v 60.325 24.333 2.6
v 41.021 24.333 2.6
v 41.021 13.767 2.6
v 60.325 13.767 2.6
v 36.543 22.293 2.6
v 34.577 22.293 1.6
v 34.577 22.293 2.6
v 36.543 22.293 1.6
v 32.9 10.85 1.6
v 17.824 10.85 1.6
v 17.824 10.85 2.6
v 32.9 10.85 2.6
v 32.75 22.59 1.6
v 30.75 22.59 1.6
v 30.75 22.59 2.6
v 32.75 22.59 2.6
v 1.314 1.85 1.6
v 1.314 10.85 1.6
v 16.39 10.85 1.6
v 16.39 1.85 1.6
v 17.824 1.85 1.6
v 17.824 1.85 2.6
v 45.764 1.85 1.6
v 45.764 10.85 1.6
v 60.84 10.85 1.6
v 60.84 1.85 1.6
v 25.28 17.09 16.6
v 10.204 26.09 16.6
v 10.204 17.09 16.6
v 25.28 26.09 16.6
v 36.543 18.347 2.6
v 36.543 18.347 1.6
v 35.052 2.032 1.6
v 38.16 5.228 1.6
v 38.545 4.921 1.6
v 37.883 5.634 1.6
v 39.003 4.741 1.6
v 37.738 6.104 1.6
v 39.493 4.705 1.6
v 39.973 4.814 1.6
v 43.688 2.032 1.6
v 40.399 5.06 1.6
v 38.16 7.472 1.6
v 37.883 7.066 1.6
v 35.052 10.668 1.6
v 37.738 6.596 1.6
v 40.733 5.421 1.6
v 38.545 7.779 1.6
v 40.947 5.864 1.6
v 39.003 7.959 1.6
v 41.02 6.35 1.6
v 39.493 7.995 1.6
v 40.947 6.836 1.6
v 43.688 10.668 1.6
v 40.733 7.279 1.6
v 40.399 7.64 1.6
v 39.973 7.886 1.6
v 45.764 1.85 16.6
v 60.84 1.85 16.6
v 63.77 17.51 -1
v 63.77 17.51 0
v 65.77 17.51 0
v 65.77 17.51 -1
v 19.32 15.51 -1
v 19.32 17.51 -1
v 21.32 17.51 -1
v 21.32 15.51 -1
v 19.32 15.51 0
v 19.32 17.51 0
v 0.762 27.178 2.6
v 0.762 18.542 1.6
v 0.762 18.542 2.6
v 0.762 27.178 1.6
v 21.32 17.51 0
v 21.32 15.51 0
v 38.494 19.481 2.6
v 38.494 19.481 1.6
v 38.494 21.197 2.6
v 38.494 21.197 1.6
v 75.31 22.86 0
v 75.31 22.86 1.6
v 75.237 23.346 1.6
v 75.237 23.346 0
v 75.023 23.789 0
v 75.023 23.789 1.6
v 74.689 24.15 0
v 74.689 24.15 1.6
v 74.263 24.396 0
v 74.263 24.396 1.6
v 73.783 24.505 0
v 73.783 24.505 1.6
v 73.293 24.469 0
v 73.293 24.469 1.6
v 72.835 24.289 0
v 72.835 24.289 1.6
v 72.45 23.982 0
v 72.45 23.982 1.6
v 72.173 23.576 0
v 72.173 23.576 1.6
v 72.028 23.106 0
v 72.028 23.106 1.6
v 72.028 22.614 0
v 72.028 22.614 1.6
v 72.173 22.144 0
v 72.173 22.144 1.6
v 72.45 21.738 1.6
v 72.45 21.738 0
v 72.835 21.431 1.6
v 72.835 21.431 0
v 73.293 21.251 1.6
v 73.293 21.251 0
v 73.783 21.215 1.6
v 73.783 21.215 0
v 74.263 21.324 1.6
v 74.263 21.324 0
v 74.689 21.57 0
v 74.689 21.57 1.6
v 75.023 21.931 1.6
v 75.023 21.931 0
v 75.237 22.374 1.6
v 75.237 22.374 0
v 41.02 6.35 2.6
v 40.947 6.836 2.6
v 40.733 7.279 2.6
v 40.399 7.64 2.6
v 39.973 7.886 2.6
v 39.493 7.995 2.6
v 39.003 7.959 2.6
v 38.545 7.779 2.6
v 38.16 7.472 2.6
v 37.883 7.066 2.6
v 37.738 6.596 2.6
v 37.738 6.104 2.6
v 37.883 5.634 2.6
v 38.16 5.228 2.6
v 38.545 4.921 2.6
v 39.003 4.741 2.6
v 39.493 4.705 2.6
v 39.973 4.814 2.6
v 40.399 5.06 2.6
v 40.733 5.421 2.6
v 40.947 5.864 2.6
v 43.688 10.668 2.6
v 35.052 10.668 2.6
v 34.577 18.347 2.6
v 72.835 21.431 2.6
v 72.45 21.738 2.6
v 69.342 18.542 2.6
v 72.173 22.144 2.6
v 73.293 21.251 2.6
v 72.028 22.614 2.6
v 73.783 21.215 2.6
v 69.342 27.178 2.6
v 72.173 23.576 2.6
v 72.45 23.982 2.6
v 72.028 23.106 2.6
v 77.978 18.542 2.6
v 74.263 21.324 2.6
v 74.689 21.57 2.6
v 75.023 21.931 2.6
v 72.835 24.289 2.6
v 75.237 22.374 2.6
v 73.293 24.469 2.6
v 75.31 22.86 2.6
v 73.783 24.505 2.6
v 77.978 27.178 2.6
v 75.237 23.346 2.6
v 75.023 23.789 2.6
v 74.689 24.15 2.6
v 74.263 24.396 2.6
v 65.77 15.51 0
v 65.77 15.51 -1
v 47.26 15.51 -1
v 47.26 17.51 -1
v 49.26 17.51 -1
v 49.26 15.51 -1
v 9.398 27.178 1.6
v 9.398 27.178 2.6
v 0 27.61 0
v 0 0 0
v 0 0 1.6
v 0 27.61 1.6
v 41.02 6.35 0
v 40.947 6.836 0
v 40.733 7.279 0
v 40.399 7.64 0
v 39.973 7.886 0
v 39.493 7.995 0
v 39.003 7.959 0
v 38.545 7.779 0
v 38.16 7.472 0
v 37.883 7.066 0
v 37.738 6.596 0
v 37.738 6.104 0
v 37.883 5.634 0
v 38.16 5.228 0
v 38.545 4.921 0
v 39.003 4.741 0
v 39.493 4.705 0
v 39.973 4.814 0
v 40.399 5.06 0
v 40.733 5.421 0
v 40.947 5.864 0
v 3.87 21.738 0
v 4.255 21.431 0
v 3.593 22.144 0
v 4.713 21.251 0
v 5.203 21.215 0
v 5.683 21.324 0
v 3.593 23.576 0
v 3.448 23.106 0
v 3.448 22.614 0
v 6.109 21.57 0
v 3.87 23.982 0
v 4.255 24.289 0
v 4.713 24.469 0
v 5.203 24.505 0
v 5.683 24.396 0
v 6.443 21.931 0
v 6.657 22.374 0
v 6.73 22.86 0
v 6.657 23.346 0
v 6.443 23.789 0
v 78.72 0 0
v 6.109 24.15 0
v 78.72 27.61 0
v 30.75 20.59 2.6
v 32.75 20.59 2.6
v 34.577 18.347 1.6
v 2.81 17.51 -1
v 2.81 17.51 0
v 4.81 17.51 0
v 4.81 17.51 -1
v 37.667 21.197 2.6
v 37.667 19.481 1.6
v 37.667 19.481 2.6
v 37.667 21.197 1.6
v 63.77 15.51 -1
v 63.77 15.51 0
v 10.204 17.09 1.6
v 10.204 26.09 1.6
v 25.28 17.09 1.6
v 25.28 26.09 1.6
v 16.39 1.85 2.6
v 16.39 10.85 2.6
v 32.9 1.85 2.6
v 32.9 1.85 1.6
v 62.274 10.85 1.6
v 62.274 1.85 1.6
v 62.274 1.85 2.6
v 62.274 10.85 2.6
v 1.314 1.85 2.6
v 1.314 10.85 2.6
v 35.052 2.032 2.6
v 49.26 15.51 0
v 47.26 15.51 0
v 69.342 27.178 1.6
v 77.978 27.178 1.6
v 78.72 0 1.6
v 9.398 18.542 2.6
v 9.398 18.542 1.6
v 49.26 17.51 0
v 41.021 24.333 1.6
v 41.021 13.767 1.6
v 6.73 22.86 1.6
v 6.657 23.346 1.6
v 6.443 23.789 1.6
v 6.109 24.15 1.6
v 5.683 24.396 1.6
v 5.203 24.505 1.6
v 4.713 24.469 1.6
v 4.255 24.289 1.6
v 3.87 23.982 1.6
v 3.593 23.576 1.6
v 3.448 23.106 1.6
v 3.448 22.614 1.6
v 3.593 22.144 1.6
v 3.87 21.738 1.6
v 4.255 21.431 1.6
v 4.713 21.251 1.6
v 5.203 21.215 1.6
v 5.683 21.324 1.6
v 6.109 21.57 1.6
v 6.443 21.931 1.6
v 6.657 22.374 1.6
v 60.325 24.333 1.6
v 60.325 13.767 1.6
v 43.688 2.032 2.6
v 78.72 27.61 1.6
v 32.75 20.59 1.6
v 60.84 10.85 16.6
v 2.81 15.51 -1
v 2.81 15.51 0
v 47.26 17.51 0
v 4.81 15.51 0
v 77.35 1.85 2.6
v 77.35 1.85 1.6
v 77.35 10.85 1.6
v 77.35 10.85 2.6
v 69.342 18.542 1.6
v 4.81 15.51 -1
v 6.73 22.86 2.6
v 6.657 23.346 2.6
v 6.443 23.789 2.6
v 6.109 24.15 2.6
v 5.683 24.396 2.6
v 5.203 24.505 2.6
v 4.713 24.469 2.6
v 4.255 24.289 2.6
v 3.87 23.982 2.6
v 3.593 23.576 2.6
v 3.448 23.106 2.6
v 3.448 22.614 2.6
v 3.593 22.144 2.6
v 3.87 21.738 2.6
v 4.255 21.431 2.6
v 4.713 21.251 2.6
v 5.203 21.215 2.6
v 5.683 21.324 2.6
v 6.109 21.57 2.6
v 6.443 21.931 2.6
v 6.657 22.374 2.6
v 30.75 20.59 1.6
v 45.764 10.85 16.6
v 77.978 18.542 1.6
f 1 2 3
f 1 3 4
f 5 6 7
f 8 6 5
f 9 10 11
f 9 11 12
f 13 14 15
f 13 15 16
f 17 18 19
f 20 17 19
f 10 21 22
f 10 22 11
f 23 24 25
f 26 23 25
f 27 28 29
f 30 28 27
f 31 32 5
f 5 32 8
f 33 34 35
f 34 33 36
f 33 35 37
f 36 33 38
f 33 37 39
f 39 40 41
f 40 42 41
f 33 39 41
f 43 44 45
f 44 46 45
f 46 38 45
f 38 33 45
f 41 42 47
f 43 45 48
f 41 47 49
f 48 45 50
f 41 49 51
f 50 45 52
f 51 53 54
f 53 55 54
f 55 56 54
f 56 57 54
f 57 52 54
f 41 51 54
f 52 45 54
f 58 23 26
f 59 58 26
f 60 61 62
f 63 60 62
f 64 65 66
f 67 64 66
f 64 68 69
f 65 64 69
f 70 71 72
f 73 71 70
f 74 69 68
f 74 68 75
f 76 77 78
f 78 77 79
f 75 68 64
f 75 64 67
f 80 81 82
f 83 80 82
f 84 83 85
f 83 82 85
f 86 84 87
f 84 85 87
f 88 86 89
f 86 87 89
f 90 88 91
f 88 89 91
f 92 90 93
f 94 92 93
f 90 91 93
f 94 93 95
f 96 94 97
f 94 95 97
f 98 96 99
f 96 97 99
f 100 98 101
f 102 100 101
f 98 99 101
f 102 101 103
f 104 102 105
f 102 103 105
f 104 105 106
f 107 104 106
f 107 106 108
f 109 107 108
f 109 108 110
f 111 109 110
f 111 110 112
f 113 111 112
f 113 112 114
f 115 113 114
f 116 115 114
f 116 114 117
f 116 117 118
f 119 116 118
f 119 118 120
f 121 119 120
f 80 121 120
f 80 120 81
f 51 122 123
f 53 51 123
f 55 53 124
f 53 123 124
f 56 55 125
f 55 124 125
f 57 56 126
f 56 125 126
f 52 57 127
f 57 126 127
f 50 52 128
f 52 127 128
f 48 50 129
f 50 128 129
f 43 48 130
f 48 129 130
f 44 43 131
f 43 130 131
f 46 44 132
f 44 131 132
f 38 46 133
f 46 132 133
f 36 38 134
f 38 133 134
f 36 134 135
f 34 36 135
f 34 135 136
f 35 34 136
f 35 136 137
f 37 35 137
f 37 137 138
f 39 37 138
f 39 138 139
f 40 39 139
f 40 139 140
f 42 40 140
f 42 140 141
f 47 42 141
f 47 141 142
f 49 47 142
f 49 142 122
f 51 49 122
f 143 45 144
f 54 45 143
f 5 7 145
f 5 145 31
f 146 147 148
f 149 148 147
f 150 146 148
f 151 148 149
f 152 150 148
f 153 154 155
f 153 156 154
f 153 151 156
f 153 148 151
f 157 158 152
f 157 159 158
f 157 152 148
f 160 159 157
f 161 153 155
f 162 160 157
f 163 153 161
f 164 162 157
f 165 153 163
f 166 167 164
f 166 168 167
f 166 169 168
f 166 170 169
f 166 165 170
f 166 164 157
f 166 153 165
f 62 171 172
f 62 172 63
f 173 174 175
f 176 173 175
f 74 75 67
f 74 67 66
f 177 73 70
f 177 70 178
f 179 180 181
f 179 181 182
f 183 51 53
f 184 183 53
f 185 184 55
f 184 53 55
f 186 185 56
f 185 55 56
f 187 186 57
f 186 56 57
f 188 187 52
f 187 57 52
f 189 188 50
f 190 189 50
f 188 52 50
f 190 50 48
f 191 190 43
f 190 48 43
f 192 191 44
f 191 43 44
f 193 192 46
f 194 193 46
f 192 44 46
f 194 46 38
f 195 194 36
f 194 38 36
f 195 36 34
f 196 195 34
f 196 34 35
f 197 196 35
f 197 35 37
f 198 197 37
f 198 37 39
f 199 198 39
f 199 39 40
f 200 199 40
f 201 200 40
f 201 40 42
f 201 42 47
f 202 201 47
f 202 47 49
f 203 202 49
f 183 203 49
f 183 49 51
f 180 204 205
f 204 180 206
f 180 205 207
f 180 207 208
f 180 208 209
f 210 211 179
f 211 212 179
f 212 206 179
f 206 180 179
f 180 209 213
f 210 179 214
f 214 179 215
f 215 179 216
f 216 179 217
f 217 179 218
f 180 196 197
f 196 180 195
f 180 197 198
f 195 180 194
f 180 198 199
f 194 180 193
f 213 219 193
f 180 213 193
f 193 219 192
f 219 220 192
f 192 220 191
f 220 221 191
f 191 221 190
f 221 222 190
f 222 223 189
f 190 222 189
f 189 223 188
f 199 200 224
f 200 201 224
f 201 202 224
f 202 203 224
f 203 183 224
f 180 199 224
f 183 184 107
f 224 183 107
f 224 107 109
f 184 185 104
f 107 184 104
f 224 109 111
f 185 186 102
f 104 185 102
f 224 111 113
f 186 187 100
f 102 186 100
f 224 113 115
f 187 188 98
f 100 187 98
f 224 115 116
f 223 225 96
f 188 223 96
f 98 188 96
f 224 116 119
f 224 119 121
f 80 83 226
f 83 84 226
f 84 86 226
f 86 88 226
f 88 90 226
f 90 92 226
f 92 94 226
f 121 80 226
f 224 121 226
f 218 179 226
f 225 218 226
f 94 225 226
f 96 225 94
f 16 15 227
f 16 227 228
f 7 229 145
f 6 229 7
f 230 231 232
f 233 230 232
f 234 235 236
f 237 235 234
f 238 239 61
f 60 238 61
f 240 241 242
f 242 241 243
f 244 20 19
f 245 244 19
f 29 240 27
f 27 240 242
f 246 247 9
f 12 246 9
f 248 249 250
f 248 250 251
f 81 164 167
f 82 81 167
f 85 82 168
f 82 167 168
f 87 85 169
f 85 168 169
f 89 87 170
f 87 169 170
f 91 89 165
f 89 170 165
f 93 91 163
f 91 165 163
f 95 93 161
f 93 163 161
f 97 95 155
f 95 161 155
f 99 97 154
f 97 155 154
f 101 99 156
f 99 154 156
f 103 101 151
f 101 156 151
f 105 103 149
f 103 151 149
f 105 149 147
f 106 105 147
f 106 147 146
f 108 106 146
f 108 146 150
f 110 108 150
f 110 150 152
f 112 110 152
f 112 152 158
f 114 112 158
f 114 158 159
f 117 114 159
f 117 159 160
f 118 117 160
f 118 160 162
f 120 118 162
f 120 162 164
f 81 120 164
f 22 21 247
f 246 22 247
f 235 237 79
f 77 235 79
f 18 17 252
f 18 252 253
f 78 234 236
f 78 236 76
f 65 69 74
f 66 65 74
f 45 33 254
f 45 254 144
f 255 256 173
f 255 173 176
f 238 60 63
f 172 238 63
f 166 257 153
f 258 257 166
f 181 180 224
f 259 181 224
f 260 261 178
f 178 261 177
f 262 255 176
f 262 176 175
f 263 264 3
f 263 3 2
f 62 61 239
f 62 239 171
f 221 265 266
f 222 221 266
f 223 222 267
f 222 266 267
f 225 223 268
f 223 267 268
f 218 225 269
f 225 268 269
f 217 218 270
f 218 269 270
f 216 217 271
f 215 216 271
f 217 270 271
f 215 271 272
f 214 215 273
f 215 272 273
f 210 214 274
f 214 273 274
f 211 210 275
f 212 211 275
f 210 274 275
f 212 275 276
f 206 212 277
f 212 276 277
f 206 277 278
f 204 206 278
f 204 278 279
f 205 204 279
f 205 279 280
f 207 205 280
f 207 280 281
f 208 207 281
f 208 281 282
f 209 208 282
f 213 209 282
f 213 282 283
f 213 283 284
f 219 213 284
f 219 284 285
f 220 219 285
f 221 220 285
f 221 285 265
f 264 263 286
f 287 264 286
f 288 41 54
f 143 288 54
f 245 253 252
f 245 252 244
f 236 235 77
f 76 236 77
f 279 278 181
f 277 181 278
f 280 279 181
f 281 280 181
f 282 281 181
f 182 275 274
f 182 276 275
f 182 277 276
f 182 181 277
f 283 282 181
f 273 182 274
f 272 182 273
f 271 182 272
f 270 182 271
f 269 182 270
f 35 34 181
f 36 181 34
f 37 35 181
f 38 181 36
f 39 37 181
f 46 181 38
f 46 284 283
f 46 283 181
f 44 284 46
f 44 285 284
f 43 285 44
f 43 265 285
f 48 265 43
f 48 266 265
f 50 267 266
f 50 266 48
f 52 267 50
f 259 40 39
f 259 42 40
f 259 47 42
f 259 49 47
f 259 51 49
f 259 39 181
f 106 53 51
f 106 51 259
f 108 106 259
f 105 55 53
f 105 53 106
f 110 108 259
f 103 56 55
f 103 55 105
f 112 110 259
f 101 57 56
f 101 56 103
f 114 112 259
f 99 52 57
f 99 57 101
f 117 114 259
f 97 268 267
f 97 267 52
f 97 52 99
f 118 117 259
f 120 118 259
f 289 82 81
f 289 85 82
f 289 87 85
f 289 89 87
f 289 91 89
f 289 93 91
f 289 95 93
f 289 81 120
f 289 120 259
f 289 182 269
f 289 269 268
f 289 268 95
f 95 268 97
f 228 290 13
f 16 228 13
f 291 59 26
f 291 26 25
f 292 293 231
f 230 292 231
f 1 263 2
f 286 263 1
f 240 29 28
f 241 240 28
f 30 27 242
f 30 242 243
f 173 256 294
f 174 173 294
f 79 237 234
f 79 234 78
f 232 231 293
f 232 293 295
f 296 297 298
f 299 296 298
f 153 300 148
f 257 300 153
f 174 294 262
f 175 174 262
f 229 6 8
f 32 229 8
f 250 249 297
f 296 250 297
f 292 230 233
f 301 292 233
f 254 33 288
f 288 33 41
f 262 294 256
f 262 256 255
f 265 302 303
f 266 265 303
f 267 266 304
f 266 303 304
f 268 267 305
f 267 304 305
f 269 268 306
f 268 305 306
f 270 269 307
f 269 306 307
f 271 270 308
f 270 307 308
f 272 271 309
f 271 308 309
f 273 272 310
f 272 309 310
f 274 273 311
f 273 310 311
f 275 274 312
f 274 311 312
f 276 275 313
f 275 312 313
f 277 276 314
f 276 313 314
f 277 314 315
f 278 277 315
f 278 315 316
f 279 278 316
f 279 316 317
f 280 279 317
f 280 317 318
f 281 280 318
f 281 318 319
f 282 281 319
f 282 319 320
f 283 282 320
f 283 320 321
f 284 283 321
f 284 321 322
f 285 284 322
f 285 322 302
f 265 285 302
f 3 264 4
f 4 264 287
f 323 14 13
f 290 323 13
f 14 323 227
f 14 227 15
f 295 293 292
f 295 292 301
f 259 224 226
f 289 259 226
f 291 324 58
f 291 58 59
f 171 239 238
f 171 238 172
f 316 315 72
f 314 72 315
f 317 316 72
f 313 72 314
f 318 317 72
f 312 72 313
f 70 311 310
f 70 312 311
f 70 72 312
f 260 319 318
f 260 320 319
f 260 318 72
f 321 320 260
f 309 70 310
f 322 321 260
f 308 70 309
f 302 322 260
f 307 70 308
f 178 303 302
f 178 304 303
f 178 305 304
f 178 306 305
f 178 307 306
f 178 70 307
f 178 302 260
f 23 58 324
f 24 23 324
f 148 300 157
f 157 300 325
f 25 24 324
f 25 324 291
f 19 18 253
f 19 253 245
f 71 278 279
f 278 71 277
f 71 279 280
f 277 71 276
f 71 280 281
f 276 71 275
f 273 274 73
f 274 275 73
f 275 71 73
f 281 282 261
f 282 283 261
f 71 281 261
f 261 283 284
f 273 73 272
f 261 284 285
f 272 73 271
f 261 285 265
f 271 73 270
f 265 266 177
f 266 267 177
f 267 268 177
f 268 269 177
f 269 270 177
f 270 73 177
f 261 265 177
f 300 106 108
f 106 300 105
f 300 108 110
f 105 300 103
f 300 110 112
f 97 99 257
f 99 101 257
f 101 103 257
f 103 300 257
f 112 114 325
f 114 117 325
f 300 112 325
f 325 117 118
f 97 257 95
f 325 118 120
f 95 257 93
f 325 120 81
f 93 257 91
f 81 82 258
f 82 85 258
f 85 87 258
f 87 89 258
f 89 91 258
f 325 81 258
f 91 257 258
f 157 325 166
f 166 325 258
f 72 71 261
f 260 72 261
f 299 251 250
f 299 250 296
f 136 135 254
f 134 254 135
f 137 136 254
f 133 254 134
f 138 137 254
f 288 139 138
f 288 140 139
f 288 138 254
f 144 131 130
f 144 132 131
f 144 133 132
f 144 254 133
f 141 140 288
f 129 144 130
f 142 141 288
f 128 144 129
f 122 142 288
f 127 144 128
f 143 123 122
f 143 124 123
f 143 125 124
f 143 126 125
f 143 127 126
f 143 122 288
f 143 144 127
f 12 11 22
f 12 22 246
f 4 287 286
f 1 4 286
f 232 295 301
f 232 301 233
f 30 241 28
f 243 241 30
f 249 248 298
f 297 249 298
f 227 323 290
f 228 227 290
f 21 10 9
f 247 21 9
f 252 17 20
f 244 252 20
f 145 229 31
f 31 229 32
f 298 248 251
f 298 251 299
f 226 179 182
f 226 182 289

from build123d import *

# Parameters (mm, degrees)
SKETCH1_W                           = 78.72
SKETCH1_H                           = 27.61
BOARD_DEPTH                         = 1.6
SKETCH2_W                           = 0.8271
SKETCH2_H                           = 1.7161
EXTRUDE_C0402_1_DEPTH               = 1
SKETCH3_W                           = 8.636
SKETCH3_H                           = 8.636
EXTRUDE_3_3_1_DEPTH                 = 1
SKETCH4_W                           = 8.636
SKETCH4_H                           = 8.636
EXTRUDE_3_3_2_DEPTH                 = 1
SKETCH5_W                           = 8.636
SKETCH5_H                           = 8.636
EXTRUDE_3_3_3_DEPTH                 = 1
SKETCH6_W                           = 19.304
SKETCH6_H                           = 10.5664
TO220H_1_DEPTH                      = 1
SKETCH7_W                           = 1.966
SKETCH7_H                           = 3.946
EXTRUDE_R0805_1_DEPTH               = 1
SKETCH8_W                           = 15.0762
SKETCH8_H                           = 9
EXTRUDE_1935789_1_DEPTH             = 15
SKETCH9_W                           = 15.0762
SKETCH9_H                           = 9
EXTRUDE_1935789_2_DEPTH             = 1
SKETCH10_W                          = 15.0762
SKETCH10_H                          = 9
EXTRUDE_1935789_3_DEPTH             = 15
SKETCH11_W                          = 15.0762
SKETCH11_H                          = 9
EXTRUDE_1935789_4_DEPTH             = 1
SKETCH12_W                          = 2
SKETCH12_H                          = 2
F_2920L400_15MR_1_DEPTH             = 1
SKETCH13_W                          = 2
SKETCH13_H                          = 2
F_2920L400_15MR_2_DEPTH             = 1
SKETCH14_W                          = 2
SKETCH14_H                          = 2
F_2920L400_15MR_3_DEPTH             = 1
SKETCH15_W                          = 2
SKETCH15_H                          = 2
F_2920L400_15MR_4_DEPTH             = 1
SKETCH16_W                          = 15.0762
SKETCH16_H                          = 9
EXTRUDE_1935789_5_DEPTH             = 1
SKETCH17_W                          = 2
SKETCH17_H                          = 2
PDM_2019_REVB_MIC4416YM4_TR_1_DEPTH = 1
SKETCH18_R                          = 1.65
CUT_EXTRUDE1_DEPTH                  = 10.16
SKETCH19_R                          = 1.65
CUT_EXTRUDE2_DEPTH                  = 10.16
SKETCH20_R                          = 1.65
CUT_EXTRUDE3_DEPTH                  = 10.16


with BuildPart() as part:
    # Sketch1 → BOARD (new body)
    with BuildSketch(Plane.XY):
        with Locations((39.36, 13.805)):
            Rectangle(SKETCH1_W, SKETCH1_H)
    extrude(amount=BOARD_DEPTH)


with BuildPart() as body_2:
    # Sketch2 → Extrude C0402-1 (new body)
    with BuildSketch(Plane.XY.offset(1.6)):
        with Locations((38.08095, 20.33905)):
            Rectangle(SKETCH2_W, SKETCH2_H)
    extrude(amount=EXTRUDE_C0402_1_DEPTH)


with BuildPart() as body_3:
    # Sketch3 → Extrude 3_3-1 (new body)
    with BuildSketch(Plane.XY.offset(1.6)):
        with Locations((5.08, 22.86)):
            Rectangle(SKETCH3_W, SKETCH3_H)
    extrude(amount=EXTRUDE_3_3_1_DEPTH)


with BuildPart() as body_4:
    # Sketch4 → Extrude 3_3-2 (new body)
    with BuildSketch(Plane.XY.offset(1.6)):
        with Locations((73.66, 22.86)):
            Rectangle(SKETCH4_W, SKETCH4_H)
    extrude(amount=EXTRUDE_3_3_2_DEPTH)


with BuildPart() as body_5:
    # Sketch5 → Extrude 3_3-3 (new body)
    with BuildSketch(Plane.XY.offset(1.6)):
        with Locations((39.37, 6.35)):
            Rectangle(SKETCH5_W, SKETCH5_H)
    extrude(amount=EXTRUDE_3_3_3_DEPTH)


with BuildPart() as body_6:
    # Sketch6 → TO220H-1 (new body)
    with BuildSketch(Plane.XY.offset(1.6)):
        with Locations((50.673, 19.05)):
            Rectangle(SKETCH6_W, SKETCH6_H)
    extrude(amount=TO220H_1_DEPTH)


with BuildPart() as body_7:
    # Sketch7 → Extrude R0805-1 (new body)
    with BuildSketch(Plane.XY.offset(1.6)):
        with Locations((35.56, 20.32)):
            Rectangle(SKETCH7_W, SKETCH7_H)
    extrude(amount=EXTRUDE_R0805_1_DEPTH)


with BuildPart() as body_8:
    # Sketch8 → Extrude 1935789-1 (new body)
    with BuildSketch(Plane.XY.offset(1.6)):
        with Locations((17.7419, 21.59)):
            Rectangle(SKETCH8_W, SKETCH8_H)
    extrude(amount=EXTRUDE_1935789_1_DEPTH)


with BuildPart() as body_9:
    # Sketch9 → Extrude 1935789-2 (new body)
    with BuildSketch(Plane.XY.offset(1.6)):
        with Locations((25.3619, 6.35)):
            Rectangle(SKETCH9_W, SKETCH9_H)
    extrude(amount=EXTRUDE_1935789_2_DEPTH)


with BuildPart() as body_10:
    # Sketch10 → Extrude 1935789-3 (new body)
    with BuildSketch(Plane.XY.offset(1.6)):
        with Locations((53.3019, 6.35)):
            Rectangle(SKETCH10_W, SKETCH10_H)
    extrude(amount=EXTRUDE_1935789_3_DEPTH)


with BuildPart() as body_11:
    # Sketch11 → Extrude 1935789-4 (new body)
    with BuildSketch(Plane.XY.offset(1.6)):
        with Locations((8.8519, 6.35)):
            Rectangle(SKETCH11_W, SKETCH11_H)
    extrude(amount=EXTRUDE_1935789_4_DEPTH)


with BuildPart() as body_12:
    # Sketch12 → 2920L400_15MR-1 (new body)
    with BuildSketch(Plane.XY):
        with Locations((20.32, 16.51)):
            Rectangle(SKETCH12_W, SKETCH12_H)
    extrude(amount=-F_2920L400_15MR_1_DEPTH)


with BuildPart() as body_13:
    # Sketch13 → 2920L400_15MR-2 (new body)
    with BuildSketch(Plane.XY):
        with Locations((48.26, 16.51)):
            Rectangle(SKETCH13_W, SKETCH13_H)
    extrude(amount=-F_2920L400_15MR_2_DEPTH)


with BuildPart() as body_14:
    # Sketch14 → 2920L400_15MR-3 (new body)
    with BuildSketch(Plane.XY):
        with Locations((3.81, 16.51)):
            Rectangle(SKETCH14_W, SKETCH14_H)
    extrude(amount=-F_2920L400_15MR_3_DEPTH)


with BuildPart() as body_15:
    # Sketch15 → 2920L400_15MR-4 (new body)
    with BuildSketch(Plane.XY):
        with Locations((64.77, 16.51)):
            Rectangle(SKETCH15_W, SKETCH15_H)
    extrude(amount=-F_2920L400_15MR_4_DEPTH)


with BuildPart() as body_16:
    # Sketch16 → Extrude 1935789-5 (new body)
    with BuildSketch(Plane.XY.offset(1.6)):
        with Locations((69.8119, 6.35)):
            Rectangle(SKETCH16_W, SKETCH16_H)
    extrude(amount=EXTRUDE_1935789_5_DEPTH)


with BuildPart() as body_17:
    # Sketch17 → PDM_2019_REVB_MIC4416YM4-TR-1 (new body)
    with BuildSketch(Plane.XY.offset(1.6)):
        with Locations((31.75, 21.59)):
            Rectangle(SKETCH17_W, SKETCH17_H)
    extrude(amount=PDM_2019_REVB_MIC4416YM4_TR_1_DEPTH)


with BuildPart() as cut_extrude1_tool:
    # Sketch18 → Cut-Extrude1 (new body)
    with BuildSketch(Plane.XY.offset(2.6)):
        with Locations((5.08, 22.86)):
            Circle(SKETCH18_R)
    extrude(amount=-CUT_EXTRUDE1_DEPTH)


with BuildPart() as part_1:
    add(part.part)

    # Cut-Extrude1: cut by cut_extrude1_tool
    add(cut_extrude1_tool.part, mode=Mode.SUBTRACT)


with BuildPart() as body_3_1:
    add(body_3.part)

    # Cut-Extrude1: cut by cut_extrude1_tool
    add(cut_extrude1_tool.part, mode=Mode.SUBTRACT)


with BuildPart() as cut_extrude2_tool:
    # Sketch19 → Cut-Extrude2 (new body)
    with BuildSketch(Plane.XY.offset(2.6)):
        with Locations((39.37, 6.35)):
            Circle(SKETCH19_R)
    extrude(amount=-CUT_EXTRUDE2_DEPTH)


with BuildPart() as part_2:
    add(part_1.part)

    # Cut-Extrude2: cut by cut_extrude2_tool
    add(cut_extrude2_tool.part, mode=Mode.SUBTRACT)


with BuildPart() as body_5_1:
    add(body_5.part)

    # Cut-Extrude2: cut by cut_extrude2_tool
    add(cut_extrude2_tool.part, mode=Mode.SUBTRACT)


with BuildPart() as cut_extrude3_tool:
    # Sketch20 → Cut-Extrude3 (new body)
    with BuildSketch(Plane.XY.offset(2.6)):
        with Locations((73.66, 22.86)):
            Circle(SKETCH20_R)
    extrude(amount=-CUT_EXTRUDE3_DEPTH)


with BuildPart() as part_3:
    add(part_2.part)

    # Cut-Extrude3: cut by cut_extrude3_tool
    add(cut_extrude3_tool.part, mode=Mode.SUBTRACT)


with BuildPart() as body_4_1:
    add(body_4.part)

    # Cut-Extrude3: cut by cut_extrude3_tool
    add(cut_extrude3_tool.part, mode=Mode.SUBTRACT)


solid = Compound([body_2.part, body_6.part, body_7.part, body_8.part, body_9.part, body_10.part, body_11.part, body_12.part, body_13.part, body_14.part, body_15.part, body_16.part, body_17.part, body_3_1.part, body_5_1.part, part_3.part, body_4_1.part])
